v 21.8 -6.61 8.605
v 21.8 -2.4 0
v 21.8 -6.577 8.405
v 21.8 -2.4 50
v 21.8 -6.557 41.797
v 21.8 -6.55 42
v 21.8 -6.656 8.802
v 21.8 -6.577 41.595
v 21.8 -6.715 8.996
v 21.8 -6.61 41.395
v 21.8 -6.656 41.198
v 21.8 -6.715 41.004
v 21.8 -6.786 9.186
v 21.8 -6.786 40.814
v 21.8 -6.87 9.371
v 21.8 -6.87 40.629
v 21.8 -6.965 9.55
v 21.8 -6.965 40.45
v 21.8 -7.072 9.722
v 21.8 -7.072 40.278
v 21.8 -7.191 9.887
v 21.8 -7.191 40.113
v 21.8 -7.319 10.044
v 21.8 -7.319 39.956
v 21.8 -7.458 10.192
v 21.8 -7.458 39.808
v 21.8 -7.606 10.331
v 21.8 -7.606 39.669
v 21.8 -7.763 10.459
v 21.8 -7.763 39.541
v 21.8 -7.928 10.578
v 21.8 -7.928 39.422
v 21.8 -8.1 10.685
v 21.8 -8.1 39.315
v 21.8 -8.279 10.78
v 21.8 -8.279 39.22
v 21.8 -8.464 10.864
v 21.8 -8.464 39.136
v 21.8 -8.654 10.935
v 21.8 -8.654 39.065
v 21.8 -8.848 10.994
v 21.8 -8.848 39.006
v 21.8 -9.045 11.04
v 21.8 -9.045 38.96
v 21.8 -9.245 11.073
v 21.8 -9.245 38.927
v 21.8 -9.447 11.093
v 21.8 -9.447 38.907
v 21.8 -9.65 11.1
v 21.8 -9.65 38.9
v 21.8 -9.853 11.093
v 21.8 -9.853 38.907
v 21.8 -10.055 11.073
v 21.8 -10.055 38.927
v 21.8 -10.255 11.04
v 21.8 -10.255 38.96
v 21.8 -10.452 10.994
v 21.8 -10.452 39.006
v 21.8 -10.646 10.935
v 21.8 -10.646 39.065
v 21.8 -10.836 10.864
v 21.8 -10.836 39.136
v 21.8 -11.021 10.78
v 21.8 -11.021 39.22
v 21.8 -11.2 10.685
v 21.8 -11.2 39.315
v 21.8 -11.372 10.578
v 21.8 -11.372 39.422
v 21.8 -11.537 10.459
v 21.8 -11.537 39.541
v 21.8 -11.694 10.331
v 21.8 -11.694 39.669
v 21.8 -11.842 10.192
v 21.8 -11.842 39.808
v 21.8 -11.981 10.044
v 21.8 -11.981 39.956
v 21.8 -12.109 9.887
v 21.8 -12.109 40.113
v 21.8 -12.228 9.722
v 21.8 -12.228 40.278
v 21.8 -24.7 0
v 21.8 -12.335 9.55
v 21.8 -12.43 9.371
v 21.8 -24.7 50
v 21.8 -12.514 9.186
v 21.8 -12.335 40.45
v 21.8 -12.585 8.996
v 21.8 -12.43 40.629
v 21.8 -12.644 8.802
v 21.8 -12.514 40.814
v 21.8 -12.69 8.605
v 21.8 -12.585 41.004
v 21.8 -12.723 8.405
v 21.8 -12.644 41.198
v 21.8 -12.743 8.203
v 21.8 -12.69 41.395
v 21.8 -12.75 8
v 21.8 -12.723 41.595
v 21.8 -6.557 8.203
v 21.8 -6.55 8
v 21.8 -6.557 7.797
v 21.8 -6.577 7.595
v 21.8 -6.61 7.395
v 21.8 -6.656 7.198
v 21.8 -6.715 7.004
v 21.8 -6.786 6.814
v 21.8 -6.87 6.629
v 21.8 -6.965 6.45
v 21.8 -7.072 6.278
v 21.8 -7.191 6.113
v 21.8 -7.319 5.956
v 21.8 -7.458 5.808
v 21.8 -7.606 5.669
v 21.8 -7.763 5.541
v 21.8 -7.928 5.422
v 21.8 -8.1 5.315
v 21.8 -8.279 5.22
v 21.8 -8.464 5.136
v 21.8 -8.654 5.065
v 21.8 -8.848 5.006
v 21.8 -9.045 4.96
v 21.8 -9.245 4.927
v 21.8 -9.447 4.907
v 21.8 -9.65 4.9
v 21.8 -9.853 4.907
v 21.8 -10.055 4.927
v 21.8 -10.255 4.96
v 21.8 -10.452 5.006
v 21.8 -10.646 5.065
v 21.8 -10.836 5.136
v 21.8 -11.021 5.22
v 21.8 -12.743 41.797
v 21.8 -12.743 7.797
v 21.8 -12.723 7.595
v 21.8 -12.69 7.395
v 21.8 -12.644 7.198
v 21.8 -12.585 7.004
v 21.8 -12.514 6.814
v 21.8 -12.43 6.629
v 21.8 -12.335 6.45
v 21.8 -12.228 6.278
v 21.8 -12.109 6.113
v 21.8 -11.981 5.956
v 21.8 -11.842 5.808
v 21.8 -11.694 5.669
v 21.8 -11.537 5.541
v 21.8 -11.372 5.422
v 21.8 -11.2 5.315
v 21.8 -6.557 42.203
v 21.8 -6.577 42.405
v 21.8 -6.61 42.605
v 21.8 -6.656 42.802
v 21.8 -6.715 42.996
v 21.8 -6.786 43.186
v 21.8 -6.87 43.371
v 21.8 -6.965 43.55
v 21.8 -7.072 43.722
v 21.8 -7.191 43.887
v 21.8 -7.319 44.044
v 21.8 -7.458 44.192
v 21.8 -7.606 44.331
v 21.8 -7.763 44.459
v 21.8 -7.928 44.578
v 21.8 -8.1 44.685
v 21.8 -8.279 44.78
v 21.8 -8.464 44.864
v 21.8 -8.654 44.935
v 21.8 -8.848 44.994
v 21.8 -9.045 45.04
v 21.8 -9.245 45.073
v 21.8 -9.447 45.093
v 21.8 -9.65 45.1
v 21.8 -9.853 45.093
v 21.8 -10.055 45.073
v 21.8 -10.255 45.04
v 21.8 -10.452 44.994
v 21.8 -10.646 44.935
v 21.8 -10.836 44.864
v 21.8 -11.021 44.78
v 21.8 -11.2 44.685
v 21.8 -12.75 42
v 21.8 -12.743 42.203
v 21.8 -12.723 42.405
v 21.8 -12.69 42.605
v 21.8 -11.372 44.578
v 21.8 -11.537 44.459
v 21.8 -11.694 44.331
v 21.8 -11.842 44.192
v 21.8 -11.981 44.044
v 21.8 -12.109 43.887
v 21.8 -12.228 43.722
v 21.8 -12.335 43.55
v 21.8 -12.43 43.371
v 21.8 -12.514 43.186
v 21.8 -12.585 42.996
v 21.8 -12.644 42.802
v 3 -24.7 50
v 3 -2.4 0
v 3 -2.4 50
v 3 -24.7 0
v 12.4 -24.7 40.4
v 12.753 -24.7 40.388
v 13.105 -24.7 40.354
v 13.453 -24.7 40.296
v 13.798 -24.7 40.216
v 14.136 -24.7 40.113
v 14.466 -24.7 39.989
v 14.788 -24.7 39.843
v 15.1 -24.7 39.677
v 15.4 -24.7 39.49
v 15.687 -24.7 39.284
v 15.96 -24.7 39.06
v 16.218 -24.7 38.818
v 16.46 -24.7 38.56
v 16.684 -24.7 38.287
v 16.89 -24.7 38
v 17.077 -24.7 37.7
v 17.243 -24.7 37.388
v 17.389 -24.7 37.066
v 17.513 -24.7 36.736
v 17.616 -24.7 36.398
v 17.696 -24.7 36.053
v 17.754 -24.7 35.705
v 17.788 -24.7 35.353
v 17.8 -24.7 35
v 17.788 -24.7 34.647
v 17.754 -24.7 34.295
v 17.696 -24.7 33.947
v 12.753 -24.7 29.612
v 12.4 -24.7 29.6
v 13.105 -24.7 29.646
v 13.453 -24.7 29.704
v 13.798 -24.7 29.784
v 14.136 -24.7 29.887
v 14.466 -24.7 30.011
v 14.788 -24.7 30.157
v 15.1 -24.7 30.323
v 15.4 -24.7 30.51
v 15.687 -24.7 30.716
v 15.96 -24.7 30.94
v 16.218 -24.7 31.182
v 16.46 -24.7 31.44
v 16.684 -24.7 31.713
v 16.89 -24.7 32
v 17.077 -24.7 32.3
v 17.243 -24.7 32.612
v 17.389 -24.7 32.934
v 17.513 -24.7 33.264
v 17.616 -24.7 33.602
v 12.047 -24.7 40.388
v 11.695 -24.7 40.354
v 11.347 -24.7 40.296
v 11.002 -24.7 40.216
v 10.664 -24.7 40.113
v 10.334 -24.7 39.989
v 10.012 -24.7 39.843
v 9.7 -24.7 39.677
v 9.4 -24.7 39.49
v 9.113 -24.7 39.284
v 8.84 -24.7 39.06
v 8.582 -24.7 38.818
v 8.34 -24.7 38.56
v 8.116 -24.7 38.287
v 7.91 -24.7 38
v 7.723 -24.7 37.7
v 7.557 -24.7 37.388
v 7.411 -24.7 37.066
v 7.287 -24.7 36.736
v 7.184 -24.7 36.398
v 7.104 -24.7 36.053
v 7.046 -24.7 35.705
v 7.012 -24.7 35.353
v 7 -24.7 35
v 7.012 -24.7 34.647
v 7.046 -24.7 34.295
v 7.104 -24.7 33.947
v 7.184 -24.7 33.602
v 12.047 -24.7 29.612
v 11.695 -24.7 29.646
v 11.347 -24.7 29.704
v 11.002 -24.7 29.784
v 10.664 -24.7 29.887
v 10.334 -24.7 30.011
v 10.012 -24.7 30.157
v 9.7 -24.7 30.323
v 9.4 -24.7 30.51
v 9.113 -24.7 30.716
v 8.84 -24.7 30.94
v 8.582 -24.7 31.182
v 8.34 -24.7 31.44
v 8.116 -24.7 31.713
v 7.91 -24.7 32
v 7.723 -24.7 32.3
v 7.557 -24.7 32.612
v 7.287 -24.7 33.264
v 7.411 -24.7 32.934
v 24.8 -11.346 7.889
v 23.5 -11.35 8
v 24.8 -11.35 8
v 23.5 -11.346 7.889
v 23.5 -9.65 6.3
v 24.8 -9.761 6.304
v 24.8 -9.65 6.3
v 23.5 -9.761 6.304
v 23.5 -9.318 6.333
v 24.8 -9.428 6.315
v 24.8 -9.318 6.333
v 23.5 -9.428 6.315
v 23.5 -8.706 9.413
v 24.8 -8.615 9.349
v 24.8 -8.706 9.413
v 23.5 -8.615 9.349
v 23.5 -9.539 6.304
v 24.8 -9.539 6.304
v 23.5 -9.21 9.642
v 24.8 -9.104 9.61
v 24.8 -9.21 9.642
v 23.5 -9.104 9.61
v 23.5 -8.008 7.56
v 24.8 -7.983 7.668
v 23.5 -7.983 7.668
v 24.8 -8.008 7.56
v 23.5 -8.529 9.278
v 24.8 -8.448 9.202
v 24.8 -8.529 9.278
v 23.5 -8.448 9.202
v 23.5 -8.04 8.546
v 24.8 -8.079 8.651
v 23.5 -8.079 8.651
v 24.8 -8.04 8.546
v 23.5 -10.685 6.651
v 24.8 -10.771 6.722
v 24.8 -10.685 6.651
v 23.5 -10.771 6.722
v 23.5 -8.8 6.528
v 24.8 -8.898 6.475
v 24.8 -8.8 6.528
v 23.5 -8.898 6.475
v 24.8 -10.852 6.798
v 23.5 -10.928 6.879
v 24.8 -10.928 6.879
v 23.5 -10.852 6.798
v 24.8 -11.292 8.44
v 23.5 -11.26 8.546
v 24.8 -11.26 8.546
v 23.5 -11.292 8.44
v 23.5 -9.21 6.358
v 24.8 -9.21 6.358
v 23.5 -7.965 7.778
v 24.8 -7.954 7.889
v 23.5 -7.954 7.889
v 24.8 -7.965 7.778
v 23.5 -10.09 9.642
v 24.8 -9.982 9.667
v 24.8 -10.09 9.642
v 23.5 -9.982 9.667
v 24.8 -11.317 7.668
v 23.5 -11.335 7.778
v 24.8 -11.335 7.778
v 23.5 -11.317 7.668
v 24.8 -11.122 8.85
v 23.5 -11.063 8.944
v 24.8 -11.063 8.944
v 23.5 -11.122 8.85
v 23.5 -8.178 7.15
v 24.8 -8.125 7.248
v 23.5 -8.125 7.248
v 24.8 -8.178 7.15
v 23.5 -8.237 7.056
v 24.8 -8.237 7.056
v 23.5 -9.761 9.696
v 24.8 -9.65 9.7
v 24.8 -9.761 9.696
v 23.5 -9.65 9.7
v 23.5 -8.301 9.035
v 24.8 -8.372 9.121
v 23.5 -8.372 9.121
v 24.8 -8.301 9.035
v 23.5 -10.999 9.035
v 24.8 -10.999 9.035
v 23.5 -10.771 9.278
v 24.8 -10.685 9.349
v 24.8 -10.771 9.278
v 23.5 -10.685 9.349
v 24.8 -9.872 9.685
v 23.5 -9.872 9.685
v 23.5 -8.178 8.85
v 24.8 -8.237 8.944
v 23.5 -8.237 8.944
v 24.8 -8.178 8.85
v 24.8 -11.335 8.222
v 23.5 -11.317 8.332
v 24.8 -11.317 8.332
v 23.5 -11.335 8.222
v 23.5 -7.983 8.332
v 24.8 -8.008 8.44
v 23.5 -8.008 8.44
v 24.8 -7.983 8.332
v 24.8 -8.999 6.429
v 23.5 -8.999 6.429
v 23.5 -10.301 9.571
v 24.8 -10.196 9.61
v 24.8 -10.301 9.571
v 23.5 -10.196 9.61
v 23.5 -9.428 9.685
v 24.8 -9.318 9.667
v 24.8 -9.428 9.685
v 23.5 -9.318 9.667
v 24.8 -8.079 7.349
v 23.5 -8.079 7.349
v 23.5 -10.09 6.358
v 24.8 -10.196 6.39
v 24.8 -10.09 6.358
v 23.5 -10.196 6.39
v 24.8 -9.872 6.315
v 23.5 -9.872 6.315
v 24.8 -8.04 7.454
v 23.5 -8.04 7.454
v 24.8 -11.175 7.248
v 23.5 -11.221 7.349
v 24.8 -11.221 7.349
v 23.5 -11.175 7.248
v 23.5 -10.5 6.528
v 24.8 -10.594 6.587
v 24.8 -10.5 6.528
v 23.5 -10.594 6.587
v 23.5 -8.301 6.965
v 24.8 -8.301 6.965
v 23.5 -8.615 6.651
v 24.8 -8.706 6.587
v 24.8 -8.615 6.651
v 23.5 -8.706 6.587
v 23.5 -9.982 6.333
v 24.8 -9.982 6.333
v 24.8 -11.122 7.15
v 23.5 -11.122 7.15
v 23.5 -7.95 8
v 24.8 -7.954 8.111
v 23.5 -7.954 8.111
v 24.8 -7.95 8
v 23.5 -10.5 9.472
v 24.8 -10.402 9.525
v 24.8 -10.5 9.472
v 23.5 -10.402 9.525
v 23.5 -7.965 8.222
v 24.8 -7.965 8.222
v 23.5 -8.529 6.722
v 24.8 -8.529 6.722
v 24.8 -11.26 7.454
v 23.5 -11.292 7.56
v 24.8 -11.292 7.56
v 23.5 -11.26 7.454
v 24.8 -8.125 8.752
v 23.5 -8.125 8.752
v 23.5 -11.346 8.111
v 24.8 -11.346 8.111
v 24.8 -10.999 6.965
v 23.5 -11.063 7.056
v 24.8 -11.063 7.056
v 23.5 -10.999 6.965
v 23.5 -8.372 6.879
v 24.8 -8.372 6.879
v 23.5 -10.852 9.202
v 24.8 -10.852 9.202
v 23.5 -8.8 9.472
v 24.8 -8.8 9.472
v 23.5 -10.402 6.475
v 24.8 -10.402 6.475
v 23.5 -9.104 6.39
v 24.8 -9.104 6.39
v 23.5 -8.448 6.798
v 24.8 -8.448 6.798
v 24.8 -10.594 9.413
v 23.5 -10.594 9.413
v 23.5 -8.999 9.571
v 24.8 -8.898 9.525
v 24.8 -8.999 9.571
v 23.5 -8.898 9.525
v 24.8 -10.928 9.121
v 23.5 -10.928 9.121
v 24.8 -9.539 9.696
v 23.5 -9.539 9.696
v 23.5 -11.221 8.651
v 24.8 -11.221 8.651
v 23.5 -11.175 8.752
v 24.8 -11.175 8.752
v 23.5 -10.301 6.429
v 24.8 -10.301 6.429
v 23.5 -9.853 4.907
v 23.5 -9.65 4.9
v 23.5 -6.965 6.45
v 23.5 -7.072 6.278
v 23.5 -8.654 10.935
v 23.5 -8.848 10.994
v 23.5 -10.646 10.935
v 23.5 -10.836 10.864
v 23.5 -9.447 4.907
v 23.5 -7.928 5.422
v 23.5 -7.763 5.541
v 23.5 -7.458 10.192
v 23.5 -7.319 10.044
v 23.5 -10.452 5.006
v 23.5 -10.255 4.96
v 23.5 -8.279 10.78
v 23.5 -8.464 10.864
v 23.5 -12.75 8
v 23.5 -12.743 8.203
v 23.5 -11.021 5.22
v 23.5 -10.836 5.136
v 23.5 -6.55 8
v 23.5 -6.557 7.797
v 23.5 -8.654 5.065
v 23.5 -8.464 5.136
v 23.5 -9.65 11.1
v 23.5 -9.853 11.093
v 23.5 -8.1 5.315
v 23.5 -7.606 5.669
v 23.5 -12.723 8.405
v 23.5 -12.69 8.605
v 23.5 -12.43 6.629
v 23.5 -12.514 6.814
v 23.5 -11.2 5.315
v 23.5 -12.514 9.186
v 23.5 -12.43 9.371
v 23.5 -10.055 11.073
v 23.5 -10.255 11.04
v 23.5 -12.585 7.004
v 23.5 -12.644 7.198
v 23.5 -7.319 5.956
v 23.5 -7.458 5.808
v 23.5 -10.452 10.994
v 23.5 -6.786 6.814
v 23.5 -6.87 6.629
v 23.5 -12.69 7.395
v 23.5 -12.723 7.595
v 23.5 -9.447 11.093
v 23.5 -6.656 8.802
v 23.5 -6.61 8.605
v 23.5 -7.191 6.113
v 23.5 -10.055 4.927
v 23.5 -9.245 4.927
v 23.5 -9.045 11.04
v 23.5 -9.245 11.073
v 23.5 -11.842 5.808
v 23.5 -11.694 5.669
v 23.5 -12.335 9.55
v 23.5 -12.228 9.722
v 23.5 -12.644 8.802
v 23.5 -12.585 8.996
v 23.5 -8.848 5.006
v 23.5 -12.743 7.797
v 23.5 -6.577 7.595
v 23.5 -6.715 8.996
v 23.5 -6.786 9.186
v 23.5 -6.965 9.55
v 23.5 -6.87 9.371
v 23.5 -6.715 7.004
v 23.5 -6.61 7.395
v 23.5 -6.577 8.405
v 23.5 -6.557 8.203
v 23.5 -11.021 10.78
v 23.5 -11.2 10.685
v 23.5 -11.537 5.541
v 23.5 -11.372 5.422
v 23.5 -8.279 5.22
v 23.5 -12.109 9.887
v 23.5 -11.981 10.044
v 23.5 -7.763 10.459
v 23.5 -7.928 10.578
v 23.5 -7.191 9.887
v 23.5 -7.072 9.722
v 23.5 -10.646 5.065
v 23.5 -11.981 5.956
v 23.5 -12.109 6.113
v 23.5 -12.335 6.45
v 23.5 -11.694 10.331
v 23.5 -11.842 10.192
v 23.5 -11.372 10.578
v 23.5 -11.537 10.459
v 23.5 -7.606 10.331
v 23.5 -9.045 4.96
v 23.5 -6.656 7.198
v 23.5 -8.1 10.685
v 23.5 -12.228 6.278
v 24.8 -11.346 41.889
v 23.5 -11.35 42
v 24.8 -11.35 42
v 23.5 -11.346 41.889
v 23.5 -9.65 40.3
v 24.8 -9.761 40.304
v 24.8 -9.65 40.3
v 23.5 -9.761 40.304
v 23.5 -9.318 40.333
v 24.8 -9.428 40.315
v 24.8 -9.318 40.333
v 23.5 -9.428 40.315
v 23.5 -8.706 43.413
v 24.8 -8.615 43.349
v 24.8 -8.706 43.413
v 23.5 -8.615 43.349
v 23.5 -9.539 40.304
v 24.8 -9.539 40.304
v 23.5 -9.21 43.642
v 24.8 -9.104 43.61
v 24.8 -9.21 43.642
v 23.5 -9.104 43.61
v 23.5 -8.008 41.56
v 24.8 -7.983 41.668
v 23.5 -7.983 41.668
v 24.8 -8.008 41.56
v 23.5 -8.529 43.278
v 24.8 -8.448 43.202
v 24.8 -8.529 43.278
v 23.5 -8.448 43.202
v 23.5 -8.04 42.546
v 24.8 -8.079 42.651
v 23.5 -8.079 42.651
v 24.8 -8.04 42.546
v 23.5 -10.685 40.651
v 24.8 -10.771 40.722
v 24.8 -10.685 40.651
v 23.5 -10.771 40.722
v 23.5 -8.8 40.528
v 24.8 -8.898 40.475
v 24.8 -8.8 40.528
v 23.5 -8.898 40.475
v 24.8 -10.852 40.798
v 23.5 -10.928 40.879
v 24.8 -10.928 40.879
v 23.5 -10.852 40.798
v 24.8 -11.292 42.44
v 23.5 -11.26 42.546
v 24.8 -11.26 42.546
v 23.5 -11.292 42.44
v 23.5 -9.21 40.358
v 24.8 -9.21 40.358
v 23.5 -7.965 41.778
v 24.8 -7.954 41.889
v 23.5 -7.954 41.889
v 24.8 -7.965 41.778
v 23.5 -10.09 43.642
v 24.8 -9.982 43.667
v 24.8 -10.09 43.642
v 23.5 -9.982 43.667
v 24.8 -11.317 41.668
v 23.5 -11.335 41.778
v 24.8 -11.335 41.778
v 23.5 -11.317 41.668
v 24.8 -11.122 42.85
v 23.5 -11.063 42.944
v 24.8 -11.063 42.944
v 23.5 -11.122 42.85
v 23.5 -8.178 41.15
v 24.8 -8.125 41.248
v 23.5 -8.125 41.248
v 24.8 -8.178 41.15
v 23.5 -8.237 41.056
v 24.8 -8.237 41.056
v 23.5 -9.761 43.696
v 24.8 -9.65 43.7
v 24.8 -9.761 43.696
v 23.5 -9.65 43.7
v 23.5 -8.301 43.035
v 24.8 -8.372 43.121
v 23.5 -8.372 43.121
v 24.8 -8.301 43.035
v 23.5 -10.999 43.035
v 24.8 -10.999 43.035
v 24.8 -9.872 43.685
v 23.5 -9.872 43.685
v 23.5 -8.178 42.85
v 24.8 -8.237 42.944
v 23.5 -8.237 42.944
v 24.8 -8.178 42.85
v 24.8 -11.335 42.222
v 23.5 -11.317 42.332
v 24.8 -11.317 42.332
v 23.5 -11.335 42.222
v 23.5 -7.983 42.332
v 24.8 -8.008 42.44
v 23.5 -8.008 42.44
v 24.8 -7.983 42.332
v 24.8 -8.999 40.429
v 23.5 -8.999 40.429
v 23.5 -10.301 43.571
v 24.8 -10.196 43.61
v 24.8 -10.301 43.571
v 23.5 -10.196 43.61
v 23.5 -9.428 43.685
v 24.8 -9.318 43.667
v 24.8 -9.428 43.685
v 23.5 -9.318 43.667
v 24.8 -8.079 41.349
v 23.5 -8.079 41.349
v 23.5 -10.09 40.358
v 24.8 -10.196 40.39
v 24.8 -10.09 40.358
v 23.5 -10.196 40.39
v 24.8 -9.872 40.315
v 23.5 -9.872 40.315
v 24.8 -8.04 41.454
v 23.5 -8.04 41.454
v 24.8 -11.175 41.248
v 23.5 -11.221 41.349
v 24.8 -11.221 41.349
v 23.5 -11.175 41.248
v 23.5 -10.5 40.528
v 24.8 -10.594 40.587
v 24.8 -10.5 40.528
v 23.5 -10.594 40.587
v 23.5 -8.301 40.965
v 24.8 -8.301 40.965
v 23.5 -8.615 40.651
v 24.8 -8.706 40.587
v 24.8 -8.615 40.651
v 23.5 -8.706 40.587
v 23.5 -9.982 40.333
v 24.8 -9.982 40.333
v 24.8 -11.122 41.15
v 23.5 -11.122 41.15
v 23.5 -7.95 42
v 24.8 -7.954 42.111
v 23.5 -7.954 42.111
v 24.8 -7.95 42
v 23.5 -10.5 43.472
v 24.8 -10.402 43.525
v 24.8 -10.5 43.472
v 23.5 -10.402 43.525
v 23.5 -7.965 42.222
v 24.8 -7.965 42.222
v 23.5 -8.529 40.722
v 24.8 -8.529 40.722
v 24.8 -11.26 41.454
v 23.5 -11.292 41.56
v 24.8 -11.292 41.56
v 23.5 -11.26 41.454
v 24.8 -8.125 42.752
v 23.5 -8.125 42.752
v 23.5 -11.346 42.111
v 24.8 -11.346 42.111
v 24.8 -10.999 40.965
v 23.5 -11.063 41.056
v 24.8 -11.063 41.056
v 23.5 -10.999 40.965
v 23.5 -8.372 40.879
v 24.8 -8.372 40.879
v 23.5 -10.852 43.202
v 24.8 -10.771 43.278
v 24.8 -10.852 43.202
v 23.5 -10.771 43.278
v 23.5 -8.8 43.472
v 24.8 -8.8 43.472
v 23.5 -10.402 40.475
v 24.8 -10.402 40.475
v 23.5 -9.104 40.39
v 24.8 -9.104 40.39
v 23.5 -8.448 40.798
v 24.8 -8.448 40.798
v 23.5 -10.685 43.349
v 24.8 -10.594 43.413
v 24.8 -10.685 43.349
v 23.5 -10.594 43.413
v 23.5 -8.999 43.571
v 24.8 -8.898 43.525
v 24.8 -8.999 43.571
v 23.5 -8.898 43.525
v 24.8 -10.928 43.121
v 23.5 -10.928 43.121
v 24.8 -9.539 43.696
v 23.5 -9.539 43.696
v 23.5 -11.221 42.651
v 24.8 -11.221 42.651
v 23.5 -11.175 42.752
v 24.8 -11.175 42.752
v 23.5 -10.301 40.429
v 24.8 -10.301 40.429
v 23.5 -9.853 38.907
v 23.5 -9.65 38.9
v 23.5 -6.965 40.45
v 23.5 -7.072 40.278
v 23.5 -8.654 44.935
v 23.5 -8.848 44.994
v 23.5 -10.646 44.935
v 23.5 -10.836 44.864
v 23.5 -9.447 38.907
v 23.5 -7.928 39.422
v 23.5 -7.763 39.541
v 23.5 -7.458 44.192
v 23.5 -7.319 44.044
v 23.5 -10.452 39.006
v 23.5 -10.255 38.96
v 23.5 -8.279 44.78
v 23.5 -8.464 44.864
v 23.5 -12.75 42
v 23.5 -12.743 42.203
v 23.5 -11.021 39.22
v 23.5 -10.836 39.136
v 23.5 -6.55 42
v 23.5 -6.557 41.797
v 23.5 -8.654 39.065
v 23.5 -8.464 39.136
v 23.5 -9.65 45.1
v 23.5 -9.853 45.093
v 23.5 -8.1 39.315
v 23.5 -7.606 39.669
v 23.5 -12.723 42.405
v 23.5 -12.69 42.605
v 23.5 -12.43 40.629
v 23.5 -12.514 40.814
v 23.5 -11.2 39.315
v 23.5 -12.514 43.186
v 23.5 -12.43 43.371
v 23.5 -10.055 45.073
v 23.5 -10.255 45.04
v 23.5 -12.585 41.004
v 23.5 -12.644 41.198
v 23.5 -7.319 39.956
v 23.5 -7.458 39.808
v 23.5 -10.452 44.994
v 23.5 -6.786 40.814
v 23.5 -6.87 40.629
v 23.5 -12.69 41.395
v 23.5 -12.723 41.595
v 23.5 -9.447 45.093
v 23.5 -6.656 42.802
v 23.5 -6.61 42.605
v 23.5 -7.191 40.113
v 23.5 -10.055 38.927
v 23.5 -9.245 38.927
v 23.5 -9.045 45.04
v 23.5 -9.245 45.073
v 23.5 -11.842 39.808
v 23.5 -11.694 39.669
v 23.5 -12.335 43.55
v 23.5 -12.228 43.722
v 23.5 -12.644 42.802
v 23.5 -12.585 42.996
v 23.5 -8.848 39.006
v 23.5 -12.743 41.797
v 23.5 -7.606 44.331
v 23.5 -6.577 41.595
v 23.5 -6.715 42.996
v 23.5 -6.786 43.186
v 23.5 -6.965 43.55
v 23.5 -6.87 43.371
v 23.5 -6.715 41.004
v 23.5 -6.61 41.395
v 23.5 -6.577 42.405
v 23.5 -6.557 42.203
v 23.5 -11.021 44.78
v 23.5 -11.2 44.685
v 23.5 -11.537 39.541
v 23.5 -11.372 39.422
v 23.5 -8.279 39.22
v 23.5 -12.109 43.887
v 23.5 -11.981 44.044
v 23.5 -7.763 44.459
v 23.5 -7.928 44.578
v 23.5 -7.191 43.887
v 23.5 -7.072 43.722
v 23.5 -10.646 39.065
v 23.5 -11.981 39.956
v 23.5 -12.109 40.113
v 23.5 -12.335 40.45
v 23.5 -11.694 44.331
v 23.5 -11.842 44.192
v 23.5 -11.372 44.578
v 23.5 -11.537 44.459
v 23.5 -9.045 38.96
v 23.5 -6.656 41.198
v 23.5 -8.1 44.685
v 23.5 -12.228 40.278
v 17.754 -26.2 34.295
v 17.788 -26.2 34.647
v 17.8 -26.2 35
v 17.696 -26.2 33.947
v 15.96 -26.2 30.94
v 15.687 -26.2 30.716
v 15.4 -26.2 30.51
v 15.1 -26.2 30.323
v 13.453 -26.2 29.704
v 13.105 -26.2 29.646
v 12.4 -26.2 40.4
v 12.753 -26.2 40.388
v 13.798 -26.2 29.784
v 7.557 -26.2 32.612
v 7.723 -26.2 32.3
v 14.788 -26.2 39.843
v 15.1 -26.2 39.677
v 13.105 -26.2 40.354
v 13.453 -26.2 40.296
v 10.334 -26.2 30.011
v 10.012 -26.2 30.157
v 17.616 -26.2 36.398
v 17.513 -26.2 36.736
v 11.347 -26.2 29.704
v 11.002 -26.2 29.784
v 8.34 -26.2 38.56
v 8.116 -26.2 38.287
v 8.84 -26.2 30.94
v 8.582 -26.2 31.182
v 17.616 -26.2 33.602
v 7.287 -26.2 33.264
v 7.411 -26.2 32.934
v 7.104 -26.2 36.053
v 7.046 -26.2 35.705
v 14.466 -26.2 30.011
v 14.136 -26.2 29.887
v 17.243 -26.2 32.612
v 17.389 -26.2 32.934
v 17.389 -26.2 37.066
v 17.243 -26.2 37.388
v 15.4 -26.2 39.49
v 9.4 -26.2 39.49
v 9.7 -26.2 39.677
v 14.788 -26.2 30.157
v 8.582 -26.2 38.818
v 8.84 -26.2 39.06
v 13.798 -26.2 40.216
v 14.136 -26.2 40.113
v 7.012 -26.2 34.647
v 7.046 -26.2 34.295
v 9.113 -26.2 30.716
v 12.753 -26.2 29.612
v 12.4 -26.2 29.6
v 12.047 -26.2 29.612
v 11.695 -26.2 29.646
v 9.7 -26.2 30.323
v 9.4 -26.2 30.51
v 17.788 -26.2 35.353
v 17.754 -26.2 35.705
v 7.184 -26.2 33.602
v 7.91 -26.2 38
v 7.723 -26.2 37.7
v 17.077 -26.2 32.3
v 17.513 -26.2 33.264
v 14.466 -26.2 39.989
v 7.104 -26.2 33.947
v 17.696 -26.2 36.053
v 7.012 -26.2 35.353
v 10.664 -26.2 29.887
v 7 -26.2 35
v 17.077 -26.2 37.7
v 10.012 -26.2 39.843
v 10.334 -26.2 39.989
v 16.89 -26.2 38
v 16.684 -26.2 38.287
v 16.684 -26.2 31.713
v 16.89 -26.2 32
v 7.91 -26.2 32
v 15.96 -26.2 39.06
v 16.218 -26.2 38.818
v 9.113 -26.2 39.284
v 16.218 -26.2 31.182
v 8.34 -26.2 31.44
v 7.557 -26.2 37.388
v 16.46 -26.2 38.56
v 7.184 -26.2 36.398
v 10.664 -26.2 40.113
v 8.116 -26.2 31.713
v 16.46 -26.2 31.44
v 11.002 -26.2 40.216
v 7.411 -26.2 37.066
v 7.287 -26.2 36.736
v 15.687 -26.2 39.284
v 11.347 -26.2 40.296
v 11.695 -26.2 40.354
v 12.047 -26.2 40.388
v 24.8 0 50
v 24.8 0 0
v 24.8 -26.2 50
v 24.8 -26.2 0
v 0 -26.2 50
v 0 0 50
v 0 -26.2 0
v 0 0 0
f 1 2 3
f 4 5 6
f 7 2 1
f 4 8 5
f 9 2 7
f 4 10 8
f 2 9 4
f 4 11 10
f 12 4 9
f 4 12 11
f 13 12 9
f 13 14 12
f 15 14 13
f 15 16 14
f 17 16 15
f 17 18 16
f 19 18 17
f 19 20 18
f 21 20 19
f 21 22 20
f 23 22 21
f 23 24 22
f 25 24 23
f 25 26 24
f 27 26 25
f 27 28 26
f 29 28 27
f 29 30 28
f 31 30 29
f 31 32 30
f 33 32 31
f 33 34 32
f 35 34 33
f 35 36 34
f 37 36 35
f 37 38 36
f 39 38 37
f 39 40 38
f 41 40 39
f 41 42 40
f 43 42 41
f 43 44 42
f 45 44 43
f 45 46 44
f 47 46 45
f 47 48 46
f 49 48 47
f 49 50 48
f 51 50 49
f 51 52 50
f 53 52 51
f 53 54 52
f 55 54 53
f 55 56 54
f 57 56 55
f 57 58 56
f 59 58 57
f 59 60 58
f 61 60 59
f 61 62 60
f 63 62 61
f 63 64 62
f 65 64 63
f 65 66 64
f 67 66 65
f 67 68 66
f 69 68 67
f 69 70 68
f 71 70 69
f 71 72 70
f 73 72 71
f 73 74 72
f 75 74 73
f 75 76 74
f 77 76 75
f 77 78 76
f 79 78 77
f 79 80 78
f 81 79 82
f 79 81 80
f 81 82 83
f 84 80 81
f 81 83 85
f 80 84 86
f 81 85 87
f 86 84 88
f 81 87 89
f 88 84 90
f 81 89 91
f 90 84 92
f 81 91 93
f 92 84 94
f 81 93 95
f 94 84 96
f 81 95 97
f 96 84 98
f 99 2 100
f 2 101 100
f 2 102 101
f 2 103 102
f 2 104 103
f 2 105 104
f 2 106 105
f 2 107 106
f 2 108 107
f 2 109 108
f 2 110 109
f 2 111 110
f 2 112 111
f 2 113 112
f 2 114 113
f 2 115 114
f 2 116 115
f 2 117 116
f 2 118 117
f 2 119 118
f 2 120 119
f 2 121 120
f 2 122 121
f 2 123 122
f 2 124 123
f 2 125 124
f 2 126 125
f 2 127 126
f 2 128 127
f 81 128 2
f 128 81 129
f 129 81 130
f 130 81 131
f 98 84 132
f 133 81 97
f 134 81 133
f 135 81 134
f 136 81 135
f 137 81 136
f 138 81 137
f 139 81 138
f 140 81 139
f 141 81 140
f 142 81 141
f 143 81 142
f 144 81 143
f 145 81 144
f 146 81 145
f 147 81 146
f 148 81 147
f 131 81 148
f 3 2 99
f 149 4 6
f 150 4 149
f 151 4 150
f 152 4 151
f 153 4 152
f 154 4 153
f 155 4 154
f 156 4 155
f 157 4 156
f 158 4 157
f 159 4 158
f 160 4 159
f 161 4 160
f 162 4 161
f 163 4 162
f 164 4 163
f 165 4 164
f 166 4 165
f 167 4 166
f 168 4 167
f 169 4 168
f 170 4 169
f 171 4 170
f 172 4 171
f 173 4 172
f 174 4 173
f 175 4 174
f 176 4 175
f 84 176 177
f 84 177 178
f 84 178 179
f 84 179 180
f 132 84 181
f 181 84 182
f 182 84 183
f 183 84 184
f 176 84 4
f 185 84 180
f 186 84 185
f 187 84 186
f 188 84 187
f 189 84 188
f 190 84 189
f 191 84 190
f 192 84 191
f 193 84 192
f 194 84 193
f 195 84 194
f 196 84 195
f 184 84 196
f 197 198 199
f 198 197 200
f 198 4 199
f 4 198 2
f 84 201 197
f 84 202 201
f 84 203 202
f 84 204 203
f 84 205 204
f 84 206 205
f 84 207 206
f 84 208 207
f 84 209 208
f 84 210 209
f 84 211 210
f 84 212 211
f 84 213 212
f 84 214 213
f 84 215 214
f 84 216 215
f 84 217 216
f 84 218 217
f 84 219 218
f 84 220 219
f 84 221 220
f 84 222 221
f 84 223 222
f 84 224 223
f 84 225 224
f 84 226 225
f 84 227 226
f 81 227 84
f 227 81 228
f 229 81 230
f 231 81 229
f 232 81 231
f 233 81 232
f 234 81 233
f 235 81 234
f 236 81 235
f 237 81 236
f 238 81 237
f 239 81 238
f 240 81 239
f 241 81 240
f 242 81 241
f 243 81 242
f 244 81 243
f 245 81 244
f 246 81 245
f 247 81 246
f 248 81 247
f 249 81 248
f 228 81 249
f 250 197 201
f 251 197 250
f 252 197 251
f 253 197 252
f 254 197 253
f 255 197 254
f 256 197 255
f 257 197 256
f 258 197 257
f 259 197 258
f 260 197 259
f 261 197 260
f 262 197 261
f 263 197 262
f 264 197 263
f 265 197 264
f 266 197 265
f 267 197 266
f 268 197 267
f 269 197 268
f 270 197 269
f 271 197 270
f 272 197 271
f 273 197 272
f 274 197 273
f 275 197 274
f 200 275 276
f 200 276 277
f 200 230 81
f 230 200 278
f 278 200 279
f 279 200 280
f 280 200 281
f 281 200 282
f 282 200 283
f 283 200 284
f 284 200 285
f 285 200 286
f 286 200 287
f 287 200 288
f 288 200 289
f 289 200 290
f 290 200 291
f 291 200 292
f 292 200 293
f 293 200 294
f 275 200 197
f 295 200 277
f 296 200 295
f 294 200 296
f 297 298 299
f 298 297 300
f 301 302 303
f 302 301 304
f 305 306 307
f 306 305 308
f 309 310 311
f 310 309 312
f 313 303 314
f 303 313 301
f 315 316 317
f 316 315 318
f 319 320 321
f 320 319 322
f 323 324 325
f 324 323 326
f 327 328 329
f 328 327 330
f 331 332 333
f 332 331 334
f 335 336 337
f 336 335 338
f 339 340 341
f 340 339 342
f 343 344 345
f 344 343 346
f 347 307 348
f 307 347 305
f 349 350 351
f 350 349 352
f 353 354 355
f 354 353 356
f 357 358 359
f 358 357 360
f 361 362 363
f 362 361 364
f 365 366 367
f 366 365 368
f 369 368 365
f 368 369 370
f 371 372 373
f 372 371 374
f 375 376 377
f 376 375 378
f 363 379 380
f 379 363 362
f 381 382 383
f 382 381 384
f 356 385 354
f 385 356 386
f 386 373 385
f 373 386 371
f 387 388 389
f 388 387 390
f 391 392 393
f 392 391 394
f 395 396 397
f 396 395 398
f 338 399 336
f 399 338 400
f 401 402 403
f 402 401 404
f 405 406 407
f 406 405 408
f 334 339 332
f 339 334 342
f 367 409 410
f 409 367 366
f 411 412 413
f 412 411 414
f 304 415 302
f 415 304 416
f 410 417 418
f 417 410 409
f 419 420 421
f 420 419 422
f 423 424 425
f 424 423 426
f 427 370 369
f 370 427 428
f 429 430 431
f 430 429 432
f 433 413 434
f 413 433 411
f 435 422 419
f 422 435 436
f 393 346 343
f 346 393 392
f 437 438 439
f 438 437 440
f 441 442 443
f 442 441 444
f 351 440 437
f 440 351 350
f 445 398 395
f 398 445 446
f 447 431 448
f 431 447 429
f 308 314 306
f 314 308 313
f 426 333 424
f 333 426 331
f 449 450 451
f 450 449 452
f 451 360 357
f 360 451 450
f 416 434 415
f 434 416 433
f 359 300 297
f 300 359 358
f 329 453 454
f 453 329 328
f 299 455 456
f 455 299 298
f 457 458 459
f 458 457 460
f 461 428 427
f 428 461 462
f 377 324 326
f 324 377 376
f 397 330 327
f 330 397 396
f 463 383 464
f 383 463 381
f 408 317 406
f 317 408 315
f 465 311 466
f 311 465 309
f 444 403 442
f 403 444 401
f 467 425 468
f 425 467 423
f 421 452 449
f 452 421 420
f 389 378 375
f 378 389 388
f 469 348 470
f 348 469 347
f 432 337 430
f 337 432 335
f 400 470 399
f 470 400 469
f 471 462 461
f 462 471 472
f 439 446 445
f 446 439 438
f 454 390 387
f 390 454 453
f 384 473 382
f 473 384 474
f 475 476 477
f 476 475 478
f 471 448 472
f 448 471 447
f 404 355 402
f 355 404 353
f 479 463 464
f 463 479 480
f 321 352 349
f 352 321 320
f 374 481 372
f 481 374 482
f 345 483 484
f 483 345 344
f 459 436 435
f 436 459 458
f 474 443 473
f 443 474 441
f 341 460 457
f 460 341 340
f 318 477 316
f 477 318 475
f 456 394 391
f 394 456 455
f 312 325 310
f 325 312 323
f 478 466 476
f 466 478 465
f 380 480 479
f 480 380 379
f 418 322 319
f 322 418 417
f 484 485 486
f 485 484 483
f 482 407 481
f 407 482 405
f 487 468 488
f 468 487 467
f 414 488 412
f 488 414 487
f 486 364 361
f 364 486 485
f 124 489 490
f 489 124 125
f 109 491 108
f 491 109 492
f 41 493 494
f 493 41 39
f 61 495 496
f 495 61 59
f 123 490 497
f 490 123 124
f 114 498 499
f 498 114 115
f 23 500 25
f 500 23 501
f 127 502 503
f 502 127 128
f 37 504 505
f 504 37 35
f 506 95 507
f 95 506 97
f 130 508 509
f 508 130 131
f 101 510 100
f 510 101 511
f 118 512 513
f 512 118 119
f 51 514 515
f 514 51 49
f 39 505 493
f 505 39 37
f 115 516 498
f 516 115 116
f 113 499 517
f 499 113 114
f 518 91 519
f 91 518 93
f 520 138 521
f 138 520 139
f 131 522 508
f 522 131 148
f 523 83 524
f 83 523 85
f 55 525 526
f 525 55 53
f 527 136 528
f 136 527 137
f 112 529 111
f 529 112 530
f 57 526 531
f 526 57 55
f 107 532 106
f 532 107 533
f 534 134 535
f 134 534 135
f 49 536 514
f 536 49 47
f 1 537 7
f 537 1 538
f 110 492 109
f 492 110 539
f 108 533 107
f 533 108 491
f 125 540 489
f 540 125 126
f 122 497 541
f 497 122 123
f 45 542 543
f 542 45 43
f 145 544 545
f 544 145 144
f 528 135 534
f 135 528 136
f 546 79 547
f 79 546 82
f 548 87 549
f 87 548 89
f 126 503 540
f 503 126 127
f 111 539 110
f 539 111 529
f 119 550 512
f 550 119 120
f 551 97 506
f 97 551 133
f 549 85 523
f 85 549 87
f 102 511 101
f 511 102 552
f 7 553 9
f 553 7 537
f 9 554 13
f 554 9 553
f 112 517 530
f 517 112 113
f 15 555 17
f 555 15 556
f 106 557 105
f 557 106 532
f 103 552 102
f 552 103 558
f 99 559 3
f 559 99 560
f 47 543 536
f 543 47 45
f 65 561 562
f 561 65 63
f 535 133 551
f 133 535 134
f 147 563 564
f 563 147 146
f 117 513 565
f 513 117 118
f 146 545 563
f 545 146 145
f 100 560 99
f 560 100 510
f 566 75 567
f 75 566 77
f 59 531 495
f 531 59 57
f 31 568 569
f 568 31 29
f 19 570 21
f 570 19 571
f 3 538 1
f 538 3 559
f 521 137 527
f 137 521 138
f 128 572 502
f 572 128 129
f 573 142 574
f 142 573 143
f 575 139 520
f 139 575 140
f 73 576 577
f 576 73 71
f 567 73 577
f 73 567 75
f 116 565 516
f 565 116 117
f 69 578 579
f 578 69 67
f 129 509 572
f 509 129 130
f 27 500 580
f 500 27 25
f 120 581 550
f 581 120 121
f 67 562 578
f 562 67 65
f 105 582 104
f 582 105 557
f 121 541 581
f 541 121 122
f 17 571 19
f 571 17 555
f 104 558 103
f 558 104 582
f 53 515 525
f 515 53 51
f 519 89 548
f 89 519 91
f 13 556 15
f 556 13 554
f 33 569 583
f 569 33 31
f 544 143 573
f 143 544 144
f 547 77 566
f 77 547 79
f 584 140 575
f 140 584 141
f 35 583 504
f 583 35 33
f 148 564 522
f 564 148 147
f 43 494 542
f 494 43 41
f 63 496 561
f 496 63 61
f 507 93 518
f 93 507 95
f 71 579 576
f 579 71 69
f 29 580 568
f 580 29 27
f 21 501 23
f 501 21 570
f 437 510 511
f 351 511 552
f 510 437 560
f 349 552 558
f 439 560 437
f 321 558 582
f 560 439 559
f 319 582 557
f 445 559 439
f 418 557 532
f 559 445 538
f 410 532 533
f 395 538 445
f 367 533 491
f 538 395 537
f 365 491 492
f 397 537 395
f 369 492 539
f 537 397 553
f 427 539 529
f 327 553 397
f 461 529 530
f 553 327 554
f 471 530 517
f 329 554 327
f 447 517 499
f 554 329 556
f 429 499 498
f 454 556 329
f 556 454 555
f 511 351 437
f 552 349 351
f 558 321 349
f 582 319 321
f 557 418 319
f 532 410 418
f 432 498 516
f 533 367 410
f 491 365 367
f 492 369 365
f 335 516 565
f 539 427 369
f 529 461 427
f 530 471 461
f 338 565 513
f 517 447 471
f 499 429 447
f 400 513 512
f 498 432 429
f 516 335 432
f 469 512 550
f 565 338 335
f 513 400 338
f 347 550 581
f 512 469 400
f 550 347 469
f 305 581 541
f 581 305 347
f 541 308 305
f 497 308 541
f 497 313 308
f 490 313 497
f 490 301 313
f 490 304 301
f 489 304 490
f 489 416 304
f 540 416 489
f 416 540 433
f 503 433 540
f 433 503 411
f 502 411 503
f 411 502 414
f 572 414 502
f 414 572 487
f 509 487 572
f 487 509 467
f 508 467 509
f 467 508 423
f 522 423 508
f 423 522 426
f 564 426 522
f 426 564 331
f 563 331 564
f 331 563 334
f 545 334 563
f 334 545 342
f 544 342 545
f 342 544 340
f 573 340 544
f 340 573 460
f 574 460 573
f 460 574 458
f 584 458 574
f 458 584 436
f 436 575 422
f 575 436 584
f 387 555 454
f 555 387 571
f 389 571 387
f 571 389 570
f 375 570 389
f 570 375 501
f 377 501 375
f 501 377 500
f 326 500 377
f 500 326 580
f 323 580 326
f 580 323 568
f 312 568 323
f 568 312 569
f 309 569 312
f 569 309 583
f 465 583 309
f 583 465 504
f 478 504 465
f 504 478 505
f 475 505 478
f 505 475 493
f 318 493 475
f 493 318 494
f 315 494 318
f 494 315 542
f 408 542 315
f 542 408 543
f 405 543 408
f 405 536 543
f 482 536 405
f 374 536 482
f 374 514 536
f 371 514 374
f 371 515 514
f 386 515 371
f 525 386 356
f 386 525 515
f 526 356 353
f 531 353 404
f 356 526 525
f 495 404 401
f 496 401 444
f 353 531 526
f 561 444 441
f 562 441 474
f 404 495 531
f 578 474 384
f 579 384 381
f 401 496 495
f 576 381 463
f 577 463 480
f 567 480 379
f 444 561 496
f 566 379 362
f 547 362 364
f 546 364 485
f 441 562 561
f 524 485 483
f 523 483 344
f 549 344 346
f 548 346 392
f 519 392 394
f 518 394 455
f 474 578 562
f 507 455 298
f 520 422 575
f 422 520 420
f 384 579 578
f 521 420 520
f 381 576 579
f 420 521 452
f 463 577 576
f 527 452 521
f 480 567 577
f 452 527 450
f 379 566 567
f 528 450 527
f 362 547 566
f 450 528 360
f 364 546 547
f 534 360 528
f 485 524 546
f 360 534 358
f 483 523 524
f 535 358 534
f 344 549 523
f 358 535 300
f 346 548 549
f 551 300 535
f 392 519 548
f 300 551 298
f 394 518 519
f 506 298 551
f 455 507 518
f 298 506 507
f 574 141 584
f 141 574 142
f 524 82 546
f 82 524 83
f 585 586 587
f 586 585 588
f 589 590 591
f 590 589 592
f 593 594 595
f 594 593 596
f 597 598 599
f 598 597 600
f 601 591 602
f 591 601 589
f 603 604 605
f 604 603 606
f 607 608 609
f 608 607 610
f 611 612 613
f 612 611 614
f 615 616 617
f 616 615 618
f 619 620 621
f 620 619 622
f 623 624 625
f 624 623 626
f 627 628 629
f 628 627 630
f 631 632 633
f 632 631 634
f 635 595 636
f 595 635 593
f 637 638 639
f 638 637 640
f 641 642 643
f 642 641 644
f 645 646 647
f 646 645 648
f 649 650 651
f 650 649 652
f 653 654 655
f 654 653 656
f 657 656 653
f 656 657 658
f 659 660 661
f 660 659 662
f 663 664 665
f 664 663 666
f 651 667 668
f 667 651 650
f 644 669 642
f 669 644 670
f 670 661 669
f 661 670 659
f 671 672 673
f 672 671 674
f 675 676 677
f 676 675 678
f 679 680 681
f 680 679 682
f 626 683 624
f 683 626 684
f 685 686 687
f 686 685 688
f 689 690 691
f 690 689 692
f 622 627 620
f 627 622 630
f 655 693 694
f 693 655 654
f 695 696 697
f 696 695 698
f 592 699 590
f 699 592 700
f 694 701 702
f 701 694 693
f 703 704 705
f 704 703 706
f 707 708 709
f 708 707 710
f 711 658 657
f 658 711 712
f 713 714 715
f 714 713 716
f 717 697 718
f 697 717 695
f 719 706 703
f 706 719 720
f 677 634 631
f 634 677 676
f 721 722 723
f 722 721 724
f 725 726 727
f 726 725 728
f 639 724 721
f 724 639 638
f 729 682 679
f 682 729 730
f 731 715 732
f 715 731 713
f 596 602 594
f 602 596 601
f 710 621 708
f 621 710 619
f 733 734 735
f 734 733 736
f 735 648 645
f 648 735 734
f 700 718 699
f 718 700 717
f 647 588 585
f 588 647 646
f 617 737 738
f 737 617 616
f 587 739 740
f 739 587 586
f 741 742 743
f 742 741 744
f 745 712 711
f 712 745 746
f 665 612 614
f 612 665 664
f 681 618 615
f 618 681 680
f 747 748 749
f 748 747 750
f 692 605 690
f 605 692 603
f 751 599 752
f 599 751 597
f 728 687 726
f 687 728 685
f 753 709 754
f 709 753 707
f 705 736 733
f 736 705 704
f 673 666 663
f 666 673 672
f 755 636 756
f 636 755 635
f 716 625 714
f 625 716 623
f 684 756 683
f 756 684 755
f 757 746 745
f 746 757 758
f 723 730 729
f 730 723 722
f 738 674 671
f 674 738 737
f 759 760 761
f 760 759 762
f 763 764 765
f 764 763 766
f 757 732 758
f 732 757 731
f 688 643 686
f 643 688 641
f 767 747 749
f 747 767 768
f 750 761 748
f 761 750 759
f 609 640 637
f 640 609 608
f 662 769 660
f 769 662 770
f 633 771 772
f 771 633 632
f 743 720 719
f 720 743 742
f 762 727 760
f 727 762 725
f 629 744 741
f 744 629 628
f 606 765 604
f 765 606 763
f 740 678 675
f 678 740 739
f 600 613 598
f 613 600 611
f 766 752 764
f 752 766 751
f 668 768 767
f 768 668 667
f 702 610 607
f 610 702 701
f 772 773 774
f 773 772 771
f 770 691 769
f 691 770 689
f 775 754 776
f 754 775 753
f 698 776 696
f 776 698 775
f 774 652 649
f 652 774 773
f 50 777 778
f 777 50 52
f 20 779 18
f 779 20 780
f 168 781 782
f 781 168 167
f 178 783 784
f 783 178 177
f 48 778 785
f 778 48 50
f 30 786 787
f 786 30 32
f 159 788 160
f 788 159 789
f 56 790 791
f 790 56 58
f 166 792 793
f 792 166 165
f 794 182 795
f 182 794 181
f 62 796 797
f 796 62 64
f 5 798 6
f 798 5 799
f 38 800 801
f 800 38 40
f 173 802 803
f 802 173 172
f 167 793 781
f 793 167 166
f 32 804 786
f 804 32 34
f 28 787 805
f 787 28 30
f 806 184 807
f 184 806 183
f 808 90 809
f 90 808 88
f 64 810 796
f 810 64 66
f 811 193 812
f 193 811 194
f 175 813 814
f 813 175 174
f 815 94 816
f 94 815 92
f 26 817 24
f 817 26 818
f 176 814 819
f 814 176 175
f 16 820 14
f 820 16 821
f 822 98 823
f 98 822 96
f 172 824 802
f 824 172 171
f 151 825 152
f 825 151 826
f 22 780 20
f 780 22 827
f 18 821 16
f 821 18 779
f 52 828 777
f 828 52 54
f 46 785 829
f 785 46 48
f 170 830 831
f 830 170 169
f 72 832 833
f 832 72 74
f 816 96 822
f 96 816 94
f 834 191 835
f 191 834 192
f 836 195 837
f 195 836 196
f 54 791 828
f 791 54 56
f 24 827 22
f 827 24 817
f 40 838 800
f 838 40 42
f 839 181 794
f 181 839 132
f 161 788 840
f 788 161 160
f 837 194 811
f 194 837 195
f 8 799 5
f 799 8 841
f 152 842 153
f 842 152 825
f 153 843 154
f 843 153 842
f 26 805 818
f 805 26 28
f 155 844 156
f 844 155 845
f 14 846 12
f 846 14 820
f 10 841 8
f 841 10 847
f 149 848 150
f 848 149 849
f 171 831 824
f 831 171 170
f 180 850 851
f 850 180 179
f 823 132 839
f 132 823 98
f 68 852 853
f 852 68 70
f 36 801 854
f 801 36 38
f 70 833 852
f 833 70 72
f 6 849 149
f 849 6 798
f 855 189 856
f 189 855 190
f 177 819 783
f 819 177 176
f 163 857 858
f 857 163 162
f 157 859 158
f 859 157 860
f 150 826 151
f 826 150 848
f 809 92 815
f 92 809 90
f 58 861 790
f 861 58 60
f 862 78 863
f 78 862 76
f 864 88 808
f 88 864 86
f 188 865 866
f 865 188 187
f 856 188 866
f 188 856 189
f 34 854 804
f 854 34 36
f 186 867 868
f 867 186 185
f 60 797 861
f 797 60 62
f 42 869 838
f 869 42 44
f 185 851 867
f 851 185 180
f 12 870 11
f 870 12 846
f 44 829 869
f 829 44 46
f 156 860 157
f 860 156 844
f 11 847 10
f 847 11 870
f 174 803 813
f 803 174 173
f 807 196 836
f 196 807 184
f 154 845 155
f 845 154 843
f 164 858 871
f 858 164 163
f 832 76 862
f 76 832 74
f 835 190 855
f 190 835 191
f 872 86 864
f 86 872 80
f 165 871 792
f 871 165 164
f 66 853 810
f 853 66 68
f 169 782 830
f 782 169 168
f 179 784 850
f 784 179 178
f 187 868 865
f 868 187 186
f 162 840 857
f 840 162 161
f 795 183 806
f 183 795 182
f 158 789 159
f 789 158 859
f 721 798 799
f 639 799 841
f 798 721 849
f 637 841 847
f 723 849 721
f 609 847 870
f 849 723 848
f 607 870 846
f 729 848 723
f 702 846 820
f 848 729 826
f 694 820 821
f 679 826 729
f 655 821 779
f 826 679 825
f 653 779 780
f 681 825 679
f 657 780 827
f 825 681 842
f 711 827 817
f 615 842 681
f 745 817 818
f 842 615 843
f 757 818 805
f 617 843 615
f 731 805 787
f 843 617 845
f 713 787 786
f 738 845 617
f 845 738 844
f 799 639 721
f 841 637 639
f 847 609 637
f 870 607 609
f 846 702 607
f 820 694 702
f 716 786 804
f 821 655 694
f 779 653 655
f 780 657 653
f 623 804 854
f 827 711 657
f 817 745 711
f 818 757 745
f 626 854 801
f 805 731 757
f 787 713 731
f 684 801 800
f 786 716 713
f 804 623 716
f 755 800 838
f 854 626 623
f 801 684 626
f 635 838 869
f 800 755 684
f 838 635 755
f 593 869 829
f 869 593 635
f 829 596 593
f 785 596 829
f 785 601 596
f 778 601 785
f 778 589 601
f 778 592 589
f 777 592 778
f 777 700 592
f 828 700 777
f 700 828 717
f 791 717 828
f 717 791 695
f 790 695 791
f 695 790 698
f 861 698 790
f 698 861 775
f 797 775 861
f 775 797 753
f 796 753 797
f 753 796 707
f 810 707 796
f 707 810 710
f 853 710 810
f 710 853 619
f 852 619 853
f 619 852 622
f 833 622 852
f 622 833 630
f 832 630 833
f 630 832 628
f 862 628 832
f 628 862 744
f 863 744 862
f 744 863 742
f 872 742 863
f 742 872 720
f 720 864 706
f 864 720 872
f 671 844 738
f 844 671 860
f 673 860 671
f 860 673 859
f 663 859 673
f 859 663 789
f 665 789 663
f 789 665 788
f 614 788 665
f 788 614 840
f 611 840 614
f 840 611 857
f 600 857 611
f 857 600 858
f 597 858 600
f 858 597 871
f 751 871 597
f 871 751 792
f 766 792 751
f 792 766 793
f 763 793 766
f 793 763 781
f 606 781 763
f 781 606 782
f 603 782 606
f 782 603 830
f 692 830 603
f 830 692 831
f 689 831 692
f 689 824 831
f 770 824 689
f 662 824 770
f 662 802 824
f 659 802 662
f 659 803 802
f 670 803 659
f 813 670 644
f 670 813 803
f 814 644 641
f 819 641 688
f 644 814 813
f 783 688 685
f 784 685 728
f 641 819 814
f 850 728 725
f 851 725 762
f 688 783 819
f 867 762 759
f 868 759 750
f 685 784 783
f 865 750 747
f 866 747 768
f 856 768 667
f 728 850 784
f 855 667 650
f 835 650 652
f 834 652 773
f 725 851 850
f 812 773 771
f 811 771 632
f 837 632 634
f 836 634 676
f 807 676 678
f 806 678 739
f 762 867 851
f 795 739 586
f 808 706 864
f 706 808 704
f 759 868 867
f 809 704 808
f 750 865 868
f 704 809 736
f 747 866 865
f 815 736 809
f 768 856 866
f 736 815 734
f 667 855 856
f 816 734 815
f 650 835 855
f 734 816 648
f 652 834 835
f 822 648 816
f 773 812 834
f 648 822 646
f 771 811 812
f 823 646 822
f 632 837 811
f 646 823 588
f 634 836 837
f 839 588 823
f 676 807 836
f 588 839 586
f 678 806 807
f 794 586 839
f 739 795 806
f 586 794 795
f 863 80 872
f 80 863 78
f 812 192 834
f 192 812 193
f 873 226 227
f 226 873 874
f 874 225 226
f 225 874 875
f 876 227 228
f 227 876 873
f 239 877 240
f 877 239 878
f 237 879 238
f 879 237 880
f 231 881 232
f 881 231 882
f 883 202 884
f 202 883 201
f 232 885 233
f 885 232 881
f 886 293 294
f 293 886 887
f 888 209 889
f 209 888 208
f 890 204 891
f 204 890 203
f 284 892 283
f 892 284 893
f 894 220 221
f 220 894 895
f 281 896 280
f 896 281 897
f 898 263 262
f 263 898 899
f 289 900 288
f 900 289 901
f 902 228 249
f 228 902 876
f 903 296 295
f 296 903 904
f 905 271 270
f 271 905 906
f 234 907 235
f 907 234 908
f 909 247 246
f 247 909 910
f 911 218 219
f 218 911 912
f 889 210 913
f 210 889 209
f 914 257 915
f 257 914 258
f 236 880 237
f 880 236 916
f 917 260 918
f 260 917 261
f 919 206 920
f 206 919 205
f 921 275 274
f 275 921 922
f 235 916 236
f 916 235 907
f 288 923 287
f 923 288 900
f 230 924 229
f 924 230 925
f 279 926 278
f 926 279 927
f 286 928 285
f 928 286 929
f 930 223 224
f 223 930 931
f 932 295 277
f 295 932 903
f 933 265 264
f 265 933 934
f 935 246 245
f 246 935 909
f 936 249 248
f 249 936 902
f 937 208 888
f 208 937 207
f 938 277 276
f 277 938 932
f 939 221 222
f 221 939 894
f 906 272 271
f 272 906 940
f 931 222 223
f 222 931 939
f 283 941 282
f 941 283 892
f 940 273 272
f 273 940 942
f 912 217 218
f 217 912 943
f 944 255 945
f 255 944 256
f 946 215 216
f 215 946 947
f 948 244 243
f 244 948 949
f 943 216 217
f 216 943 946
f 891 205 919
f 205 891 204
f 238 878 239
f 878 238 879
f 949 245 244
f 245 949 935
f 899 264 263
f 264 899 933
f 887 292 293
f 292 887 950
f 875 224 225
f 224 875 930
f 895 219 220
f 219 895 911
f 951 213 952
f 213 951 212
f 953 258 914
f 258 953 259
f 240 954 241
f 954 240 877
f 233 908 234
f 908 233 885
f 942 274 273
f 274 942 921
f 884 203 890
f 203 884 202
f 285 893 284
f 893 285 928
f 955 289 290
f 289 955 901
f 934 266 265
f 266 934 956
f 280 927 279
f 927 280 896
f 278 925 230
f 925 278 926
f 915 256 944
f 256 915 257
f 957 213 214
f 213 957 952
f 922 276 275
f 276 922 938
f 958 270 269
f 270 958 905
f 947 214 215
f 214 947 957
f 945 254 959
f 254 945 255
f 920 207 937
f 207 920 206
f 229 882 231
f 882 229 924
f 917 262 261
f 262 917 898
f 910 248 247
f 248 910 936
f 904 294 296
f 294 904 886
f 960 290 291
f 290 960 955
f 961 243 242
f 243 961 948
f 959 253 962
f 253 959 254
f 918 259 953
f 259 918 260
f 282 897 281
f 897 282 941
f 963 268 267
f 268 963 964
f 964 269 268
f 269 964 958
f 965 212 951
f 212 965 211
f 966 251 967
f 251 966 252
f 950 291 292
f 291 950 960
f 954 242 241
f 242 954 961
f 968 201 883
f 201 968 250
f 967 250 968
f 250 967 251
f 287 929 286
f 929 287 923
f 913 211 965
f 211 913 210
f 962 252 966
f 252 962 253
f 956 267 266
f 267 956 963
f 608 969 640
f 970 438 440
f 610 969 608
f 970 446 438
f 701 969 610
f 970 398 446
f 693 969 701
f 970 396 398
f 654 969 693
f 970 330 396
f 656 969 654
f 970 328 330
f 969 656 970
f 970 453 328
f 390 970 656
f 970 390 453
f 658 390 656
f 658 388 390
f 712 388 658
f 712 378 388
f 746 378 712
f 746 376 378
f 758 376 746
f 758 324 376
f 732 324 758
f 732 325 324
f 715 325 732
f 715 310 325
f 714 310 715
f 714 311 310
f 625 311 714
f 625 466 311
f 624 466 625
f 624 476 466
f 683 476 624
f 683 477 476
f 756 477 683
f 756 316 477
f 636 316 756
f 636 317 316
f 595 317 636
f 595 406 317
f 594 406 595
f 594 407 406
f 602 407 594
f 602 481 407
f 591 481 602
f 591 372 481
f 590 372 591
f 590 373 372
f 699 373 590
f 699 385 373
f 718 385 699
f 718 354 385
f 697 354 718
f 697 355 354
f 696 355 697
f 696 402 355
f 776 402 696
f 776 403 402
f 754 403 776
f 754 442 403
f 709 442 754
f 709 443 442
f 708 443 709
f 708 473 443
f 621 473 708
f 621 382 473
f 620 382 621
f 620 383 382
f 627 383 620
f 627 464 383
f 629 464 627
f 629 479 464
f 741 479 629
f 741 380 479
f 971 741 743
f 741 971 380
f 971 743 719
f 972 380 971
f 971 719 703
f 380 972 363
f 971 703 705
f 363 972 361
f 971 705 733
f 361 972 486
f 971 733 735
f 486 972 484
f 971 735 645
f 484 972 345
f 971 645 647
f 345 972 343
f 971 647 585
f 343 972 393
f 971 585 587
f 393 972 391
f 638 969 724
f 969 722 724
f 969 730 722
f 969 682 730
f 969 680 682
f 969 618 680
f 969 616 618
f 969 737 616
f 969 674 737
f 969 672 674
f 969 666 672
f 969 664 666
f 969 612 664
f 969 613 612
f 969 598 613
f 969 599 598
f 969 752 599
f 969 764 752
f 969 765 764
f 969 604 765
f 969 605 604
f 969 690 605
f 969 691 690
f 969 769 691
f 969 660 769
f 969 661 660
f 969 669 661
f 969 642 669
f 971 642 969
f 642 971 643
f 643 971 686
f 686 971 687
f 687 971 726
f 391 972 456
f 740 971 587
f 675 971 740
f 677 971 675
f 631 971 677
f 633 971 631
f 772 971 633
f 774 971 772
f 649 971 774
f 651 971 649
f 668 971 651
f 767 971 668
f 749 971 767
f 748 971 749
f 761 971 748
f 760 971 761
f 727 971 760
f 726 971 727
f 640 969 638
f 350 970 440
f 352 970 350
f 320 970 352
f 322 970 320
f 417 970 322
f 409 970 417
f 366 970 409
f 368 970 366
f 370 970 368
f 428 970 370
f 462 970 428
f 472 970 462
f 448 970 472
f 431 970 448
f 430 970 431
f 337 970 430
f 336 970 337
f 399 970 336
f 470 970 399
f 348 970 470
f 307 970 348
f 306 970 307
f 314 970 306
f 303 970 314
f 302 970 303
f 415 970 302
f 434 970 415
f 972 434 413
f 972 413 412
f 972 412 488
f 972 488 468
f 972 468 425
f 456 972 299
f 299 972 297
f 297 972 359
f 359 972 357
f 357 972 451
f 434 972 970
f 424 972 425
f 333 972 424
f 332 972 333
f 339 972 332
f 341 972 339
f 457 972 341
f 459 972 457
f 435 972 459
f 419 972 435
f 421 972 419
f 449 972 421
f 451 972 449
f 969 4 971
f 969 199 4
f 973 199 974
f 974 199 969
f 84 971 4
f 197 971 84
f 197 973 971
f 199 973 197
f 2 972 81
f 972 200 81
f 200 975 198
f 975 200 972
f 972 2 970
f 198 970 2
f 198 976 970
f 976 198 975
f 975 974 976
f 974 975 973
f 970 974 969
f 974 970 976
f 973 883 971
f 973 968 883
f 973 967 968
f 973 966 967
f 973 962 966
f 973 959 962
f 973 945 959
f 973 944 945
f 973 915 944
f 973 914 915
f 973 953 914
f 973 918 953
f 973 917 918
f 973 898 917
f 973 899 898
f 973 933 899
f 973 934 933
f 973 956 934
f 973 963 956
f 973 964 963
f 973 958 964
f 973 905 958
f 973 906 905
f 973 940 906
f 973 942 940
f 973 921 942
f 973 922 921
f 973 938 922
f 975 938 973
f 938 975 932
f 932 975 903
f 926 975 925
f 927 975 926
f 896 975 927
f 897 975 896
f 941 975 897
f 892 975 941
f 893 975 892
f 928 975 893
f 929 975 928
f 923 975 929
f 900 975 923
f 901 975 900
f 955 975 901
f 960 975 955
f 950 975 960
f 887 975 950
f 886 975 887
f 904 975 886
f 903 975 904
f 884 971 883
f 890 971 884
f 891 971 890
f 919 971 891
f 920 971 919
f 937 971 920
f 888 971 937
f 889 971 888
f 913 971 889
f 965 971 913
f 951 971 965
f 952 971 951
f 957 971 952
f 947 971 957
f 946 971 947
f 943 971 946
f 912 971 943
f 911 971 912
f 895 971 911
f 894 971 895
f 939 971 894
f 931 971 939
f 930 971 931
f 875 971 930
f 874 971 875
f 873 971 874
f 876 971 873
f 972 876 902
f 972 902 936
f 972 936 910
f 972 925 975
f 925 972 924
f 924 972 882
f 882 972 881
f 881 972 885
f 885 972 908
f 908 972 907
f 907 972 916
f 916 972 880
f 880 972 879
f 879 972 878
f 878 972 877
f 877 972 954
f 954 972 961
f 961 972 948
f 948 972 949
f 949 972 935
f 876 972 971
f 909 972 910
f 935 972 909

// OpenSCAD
$fn=96;

module part() {
difference() {
union() {
    translate([0,-26.2,0]) cube([24.8,26.2,50]);
}
union() {
    translate([3,-24.7,-1]) cube([18.8,22.3,52]);
    translate([21.7,-9.65,8]) rotate([0,90,0]) cylinder(r=1.7,h=3.2);
    translate([21.7,-9.65,8]) rotate([0,90,0]) cylinder(r=3.1,h=1.8);
    translate([21.7,-9.65,42]) rotate([0,90,0]) cylinder(r=1.7,h=3.2);
    translate([21.7,-9.65,42]) rotate([0,90,0]) cylinder(r=3.1,h=1.8);
    translate([12.4,-26.3,35]) rotate([-90,0,0]) cylinder(r=5.4,h=1.7);
}
}
}

part();
